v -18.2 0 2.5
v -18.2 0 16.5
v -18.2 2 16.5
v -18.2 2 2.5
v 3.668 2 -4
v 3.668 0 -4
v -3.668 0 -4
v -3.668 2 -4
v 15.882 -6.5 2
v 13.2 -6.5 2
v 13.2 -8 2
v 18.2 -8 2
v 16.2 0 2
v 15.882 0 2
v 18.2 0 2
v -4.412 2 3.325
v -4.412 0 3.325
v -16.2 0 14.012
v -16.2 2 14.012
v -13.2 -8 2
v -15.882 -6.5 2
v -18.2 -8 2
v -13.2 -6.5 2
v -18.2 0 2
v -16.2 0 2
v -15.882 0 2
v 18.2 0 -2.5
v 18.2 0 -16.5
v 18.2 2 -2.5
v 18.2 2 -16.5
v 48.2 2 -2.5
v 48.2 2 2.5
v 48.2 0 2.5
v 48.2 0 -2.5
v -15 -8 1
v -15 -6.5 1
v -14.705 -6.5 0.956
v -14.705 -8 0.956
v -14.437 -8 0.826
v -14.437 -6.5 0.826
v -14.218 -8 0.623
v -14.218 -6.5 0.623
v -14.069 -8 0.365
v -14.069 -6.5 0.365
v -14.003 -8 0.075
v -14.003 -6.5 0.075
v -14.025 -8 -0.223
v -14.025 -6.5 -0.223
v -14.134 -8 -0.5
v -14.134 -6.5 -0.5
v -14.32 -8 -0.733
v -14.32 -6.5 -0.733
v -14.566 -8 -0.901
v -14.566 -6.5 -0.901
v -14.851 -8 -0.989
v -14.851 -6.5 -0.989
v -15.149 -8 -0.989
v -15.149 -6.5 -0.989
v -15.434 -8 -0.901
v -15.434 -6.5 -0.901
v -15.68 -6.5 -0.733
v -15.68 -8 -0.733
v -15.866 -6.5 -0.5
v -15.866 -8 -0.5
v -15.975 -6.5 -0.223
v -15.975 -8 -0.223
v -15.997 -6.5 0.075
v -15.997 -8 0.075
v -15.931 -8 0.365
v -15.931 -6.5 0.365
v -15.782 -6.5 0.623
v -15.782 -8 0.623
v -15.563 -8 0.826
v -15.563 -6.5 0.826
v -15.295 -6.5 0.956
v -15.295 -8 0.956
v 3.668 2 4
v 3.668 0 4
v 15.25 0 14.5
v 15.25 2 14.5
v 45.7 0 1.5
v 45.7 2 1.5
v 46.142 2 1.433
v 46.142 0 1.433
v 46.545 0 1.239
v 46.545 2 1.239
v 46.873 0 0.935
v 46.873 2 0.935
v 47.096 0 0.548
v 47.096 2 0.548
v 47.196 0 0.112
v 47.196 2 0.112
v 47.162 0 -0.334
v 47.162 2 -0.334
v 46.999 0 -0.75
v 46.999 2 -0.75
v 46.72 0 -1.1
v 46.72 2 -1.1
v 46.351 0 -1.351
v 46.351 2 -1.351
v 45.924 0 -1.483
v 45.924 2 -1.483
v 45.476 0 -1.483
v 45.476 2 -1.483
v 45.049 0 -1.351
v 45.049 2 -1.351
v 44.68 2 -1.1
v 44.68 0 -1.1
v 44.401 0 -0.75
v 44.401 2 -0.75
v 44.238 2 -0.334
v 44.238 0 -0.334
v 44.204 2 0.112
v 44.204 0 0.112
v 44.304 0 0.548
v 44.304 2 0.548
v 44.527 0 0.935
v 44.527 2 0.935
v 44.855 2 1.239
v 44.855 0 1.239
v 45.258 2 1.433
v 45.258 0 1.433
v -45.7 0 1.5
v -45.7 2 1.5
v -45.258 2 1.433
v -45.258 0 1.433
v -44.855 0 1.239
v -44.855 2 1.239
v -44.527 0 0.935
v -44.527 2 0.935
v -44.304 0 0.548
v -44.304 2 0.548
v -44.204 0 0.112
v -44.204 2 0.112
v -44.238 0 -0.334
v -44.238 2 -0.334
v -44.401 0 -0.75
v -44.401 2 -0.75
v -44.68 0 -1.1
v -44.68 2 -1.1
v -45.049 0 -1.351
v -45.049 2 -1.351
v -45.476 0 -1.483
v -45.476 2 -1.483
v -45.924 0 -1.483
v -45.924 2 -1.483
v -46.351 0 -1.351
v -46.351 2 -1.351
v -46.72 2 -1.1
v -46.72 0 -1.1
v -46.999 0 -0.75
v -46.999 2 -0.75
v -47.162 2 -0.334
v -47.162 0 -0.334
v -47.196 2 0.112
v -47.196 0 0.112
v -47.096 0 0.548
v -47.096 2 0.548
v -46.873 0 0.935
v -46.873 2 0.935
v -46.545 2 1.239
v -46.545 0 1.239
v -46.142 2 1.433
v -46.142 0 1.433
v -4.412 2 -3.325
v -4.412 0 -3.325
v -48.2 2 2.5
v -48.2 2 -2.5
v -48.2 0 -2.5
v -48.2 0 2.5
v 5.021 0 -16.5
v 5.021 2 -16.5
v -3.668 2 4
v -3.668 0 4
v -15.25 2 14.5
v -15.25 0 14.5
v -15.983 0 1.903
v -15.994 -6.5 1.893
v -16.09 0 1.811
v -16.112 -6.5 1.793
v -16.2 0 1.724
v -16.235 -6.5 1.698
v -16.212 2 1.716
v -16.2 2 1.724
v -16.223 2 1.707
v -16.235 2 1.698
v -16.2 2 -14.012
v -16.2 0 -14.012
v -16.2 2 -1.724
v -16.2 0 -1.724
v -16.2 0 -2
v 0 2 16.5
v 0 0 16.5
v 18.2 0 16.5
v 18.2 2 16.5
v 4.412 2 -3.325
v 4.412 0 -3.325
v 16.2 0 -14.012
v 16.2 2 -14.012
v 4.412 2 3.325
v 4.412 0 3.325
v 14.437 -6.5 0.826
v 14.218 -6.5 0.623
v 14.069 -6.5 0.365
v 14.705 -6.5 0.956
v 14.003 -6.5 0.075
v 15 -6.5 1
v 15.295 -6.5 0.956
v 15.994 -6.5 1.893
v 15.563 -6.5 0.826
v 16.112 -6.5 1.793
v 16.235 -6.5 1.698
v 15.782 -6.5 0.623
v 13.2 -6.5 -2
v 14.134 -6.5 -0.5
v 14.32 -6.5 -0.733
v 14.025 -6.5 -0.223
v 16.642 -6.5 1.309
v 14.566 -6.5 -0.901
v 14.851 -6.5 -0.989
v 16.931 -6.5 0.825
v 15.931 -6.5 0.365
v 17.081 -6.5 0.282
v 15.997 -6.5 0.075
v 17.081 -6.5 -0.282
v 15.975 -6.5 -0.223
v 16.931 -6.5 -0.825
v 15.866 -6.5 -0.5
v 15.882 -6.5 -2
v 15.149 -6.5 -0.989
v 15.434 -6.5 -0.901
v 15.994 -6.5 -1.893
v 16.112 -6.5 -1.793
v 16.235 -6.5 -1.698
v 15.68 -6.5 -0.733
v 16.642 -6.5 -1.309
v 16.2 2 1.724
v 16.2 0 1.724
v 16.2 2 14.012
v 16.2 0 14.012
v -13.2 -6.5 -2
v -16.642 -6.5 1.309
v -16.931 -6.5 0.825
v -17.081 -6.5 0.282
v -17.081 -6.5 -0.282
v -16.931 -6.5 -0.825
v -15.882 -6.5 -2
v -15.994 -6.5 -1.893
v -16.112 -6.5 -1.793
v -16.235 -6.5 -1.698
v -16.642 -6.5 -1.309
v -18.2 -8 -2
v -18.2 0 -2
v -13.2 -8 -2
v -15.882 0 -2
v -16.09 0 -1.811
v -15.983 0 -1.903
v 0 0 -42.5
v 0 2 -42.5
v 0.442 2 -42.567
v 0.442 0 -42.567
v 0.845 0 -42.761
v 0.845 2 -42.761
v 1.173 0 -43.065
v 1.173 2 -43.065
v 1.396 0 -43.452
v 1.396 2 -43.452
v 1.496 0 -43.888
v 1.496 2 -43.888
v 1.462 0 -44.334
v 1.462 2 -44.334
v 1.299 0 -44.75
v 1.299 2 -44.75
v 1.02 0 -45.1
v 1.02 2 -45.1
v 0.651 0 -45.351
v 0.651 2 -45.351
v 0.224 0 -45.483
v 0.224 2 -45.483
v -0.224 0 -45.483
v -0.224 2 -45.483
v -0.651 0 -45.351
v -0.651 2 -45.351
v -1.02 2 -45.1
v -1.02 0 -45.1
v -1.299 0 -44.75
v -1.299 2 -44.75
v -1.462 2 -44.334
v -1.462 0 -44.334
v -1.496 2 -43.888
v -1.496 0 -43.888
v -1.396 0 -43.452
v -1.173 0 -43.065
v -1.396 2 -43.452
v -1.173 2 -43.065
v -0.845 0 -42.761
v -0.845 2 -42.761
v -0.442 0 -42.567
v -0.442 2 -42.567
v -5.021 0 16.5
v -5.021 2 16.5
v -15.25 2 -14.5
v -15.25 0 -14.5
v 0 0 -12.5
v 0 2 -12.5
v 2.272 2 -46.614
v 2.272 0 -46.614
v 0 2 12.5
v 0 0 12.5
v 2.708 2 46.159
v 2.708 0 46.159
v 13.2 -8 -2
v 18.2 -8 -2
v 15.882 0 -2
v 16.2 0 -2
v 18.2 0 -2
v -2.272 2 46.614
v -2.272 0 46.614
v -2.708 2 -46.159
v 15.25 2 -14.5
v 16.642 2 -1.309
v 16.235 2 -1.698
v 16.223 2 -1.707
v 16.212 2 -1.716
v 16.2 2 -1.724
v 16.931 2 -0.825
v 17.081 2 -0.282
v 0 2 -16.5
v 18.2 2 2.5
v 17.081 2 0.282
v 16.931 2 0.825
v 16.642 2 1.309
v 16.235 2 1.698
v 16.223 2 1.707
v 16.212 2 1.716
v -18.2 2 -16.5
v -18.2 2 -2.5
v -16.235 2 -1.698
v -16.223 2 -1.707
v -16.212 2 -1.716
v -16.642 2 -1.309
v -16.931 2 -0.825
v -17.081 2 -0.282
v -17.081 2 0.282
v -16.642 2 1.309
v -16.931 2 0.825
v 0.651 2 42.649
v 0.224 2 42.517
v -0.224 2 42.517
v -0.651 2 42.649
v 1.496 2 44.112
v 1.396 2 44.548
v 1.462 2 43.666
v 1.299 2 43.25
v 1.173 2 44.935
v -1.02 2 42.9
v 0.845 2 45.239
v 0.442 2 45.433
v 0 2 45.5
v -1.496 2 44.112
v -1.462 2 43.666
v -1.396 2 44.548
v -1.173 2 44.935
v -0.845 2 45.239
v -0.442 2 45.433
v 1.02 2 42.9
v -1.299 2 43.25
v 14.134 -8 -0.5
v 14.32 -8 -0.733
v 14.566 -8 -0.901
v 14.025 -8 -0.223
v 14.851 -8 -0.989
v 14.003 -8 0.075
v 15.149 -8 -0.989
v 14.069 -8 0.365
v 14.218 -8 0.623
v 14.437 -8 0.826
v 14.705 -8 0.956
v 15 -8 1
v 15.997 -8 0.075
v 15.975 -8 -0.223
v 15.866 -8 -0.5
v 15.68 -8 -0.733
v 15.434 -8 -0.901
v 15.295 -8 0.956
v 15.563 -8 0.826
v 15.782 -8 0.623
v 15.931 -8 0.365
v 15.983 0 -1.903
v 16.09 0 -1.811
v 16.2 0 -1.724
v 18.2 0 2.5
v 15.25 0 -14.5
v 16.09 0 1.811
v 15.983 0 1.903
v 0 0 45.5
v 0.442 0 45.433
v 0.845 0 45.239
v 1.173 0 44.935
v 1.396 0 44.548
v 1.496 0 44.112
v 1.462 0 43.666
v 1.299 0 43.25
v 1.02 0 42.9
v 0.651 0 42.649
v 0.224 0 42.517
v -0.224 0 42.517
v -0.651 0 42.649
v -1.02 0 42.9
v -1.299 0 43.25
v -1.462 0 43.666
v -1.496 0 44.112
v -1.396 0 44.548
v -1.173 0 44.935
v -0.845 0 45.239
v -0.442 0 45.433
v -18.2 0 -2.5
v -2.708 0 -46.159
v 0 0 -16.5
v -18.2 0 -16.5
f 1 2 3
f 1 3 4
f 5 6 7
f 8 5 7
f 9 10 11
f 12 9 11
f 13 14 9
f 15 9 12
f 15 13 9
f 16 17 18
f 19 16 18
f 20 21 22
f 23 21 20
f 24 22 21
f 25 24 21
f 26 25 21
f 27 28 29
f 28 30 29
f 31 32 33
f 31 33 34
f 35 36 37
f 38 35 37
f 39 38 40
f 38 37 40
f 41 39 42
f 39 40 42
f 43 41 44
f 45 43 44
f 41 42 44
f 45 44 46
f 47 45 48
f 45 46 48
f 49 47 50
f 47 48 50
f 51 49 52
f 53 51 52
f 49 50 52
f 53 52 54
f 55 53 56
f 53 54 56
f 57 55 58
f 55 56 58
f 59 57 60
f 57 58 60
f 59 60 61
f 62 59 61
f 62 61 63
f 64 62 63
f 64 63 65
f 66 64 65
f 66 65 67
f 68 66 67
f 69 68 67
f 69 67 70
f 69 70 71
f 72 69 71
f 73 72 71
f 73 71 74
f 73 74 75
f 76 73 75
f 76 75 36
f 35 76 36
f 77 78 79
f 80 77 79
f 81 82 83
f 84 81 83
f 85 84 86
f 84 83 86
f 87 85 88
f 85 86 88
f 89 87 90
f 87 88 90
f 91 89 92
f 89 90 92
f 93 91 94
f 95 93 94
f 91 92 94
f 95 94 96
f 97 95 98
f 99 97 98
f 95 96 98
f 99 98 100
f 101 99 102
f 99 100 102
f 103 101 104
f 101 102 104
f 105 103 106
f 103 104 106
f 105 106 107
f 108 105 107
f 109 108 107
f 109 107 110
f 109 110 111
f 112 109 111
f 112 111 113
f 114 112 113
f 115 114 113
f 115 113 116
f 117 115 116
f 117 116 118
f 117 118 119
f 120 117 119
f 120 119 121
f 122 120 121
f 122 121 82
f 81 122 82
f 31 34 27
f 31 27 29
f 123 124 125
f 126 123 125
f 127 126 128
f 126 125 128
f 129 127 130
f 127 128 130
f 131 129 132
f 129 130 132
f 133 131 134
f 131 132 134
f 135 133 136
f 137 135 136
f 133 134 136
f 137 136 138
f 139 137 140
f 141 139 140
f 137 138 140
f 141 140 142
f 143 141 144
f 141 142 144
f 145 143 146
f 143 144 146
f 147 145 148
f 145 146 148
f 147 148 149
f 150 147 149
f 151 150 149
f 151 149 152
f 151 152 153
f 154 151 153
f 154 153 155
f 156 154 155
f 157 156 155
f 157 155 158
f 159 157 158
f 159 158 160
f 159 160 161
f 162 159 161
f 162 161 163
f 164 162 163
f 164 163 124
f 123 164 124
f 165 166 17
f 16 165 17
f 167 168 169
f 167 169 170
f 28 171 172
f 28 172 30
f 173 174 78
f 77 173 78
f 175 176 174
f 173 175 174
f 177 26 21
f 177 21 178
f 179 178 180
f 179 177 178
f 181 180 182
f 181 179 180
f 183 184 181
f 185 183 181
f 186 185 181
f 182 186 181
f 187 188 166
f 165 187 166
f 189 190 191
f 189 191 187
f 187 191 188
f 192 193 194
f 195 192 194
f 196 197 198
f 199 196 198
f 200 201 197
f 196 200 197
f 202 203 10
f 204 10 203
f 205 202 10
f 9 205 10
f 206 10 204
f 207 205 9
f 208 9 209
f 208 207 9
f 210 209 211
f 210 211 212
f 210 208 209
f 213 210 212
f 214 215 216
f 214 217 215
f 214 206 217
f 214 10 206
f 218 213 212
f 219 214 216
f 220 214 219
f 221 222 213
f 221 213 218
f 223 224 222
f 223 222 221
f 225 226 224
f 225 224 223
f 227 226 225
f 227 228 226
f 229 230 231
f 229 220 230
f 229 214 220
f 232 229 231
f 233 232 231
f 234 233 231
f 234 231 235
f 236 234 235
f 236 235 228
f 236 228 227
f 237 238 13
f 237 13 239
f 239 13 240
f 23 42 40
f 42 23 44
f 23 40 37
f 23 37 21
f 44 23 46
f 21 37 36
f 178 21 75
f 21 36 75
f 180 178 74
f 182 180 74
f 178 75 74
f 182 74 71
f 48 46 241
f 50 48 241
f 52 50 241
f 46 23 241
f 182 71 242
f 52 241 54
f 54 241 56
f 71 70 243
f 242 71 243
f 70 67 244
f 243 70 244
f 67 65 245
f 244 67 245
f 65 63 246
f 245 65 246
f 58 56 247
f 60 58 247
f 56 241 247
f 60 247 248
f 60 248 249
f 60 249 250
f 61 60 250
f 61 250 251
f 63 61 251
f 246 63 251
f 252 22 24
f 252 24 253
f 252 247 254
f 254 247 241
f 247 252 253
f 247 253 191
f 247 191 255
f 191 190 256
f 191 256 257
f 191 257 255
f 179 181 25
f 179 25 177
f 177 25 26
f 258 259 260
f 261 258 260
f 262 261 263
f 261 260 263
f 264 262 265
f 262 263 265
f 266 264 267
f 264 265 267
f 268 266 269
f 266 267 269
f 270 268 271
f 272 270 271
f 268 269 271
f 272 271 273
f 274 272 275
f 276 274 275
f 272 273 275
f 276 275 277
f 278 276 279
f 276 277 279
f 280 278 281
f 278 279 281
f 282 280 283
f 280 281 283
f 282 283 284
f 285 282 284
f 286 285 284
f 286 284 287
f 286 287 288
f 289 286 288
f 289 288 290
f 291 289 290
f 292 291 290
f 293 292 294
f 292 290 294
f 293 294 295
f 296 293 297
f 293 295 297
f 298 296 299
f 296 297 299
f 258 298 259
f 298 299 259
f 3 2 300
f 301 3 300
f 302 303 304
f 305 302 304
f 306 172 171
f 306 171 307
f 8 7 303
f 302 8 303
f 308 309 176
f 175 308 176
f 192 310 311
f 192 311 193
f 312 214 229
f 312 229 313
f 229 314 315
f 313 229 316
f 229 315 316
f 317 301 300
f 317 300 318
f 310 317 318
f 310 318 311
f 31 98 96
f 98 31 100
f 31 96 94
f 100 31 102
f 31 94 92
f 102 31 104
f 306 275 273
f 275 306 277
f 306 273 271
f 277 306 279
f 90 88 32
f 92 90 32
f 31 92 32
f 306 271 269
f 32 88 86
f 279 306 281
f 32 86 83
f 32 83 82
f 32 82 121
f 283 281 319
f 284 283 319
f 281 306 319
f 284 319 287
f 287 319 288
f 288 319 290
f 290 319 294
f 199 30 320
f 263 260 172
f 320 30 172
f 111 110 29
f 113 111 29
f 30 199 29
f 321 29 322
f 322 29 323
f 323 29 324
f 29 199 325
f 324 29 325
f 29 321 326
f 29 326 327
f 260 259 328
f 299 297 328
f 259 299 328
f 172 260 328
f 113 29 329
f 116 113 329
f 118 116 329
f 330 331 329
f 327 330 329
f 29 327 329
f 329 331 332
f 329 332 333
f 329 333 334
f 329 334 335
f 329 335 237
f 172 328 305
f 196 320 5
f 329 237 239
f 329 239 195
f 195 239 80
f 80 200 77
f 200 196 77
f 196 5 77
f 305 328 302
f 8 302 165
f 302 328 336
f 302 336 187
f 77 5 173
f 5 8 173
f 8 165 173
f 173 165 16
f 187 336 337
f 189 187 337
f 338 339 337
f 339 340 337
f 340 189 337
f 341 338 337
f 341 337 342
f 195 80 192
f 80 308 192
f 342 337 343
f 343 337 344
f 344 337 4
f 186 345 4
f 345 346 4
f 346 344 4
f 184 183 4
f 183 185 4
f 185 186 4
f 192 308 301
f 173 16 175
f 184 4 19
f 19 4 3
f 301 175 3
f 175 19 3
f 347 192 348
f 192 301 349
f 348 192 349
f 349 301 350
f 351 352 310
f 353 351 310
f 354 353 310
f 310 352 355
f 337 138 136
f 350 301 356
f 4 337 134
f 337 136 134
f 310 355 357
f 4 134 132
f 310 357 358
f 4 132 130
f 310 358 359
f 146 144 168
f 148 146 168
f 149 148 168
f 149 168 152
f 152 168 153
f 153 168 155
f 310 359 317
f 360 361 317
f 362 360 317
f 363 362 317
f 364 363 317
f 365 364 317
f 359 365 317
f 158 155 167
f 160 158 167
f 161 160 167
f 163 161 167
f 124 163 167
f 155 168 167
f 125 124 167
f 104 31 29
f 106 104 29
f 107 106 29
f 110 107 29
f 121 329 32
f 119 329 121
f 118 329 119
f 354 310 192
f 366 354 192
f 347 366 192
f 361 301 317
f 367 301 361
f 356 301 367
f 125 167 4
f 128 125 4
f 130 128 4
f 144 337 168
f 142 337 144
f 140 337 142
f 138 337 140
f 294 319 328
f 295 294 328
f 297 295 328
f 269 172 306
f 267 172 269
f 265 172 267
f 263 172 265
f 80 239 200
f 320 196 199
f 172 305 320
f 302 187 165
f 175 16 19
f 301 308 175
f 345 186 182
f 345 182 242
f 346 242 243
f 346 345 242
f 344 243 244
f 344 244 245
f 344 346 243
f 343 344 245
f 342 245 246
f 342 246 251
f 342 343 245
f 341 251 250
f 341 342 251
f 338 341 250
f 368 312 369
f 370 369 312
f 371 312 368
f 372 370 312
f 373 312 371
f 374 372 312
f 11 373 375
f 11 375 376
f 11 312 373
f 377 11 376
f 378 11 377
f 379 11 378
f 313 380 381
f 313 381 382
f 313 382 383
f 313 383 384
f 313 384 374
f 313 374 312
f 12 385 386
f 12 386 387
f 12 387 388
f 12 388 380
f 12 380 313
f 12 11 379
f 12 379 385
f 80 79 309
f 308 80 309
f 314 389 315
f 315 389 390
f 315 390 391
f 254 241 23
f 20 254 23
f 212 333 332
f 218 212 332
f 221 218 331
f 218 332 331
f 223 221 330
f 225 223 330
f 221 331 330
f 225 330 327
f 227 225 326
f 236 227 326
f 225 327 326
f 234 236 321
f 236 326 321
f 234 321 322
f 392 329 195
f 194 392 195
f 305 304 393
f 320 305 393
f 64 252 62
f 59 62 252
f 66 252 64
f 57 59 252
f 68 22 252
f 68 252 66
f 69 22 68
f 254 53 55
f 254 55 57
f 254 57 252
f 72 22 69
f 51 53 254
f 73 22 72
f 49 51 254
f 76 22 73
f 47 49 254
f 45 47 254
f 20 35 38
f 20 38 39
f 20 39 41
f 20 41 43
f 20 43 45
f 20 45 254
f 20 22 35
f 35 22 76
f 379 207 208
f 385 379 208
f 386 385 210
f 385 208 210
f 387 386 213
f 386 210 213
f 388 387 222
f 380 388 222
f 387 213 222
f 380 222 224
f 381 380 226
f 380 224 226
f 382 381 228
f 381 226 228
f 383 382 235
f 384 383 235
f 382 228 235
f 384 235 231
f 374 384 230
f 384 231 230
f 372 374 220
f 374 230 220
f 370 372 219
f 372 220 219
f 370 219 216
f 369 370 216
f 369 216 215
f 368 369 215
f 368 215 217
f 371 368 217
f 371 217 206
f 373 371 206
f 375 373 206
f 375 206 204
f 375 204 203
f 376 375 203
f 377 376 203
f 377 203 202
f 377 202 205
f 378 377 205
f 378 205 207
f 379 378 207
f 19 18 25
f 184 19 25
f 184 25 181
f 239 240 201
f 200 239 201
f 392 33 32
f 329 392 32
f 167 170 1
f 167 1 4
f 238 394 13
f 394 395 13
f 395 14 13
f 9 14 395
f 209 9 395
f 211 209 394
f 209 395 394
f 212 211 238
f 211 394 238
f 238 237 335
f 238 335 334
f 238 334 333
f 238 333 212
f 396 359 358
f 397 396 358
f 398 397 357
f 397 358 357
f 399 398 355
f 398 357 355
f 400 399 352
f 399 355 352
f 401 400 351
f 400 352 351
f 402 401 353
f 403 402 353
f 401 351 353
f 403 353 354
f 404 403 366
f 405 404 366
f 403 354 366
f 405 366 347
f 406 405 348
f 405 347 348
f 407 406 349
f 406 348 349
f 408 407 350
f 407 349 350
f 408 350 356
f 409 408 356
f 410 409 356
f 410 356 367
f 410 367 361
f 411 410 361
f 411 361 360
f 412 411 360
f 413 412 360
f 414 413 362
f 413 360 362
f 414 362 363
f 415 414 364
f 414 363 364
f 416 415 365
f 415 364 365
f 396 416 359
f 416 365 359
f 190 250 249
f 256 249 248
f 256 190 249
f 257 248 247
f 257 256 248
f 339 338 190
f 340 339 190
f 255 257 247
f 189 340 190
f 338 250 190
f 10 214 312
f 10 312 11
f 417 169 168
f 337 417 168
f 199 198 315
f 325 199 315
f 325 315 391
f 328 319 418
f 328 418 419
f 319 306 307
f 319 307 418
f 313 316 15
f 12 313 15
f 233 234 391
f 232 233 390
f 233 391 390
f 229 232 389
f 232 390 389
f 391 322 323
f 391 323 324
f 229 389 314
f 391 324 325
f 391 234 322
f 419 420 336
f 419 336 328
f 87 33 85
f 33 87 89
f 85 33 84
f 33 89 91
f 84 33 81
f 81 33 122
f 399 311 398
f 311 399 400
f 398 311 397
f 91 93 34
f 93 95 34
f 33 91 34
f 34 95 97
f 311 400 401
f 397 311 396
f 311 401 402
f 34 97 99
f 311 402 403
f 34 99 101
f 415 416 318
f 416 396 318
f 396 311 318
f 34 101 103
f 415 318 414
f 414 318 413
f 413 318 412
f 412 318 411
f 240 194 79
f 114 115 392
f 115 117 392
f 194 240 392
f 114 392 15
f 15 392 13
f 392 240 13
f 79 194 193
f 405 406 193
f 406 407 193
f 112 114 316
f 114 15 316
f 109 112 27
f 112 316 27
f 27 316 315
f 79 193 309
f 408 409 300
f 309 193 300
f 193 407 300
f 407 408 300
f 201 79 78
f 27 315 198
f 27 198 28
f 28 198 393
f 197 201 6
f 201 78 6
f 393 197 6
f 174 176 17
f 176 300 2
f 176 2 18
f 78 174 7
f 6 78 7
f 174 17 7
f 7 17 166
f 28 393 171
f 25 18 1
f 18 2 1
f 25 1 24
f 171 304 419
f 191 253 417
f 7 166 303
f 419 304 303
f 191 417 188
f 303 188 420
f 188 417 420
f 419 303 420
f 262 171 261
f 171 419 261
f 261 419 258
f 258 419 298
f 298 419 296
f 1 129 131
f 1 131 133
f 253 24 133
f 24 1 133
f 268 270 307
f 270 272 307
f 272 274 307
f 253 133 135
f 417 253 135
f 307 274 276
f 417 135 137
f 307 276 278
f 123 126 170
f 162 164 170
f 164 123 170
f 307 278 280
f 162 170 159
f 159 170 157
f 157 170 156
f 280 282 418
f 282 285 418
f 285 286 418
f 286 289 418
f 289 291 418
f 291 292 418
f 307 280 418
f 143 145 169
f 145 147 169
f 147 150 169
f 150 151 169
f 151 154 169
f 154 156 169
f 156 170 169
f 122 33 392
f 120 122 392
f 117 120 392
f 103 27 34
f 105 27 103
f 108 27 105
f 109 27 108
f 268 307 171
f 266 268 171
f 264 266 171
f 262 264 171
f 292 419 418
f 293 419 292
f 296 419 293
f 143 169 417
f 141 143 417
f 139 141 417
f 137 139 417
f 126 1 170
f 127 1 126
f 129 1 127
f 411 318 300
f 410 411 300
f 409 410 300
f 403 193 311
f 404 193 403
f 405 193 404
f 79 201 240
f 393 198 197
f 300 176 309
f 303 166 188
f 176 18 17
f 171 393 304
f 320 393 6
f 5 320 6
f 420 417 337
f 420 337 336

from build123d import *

# Parameters (mm, degrees)
SKETCH1_W           = 36.4
SKETCH1_H           = 33
BOSS_EXTRUDE1_DEPTH = 2
SKETCH2_W           = 5
SKETCH2_H           = 4
BOSS_EXTRUDE2_DEPTH = 8
SKETCH4_R           = 1
CUT_EXTRUDE2_DEPTH  = 27.162759793
CUT_EXTRUDE1_DEPTH  = 8.5
SKETCH5_W           = 5
SKETCH5_H           = 2
BOSS_EXTRUDE3_DEPTH = 30
SKETCH6_W           = 5
SKETCH6_H           = 2
BOSS_EXTRUDE4_DEPTH = 30
SKETCH11_R          = 1.5
CUT_EXTRUDE3_DEPTH  = 52.918108594
SKETCH10_R          = 1.5
BOSS_EXTRUDE5_DEPTH = 2


with BuildPart() as part:
    # Sketch1 → Boss-Extrude1 (new body)
    with BuildSketch(Plane(origin=(0, 0, 0), x_dir=(1, 0, 0), z_dir=(0, 1, 0))):
        Rectangle(SKETCH1_W, SKETCH1_H)
        Polygon((-4.412121212, -3.325108971), (-16.2, -14.011922158), (-16.2, 14.011922158), (-4.412121212, 3.325108971), align=None, mode=Mode.SUBTRACT)
        Polygon((-15.249514138, -14.5), (-3.667695956, -4), (3.667695956, -4), (15.249514138, -14.5), (0, -12.5), align=None, mode=Mode.SUBTRACT)
        Polygon((16.2, -14.011922158), (4.412121212, -3.325108971), (4.412121212, 3.325108971), (16.2, 14.011922158), align=None, mode=Mode.SUBTRACT)
        Polygon((15.249514138, 14.5), (3.667695956, 4), (-3.667695956, 4), (-15.249514138, 14.5), (0, 12.5), align=None, mode=Mode.SUBTRACT)
    extrude(amount=BOSS_EXTRUDE1_DEPTH)

    # Sketch2 → Boss-Extrude2 (add)
    with BuildSketch(Plane.XZ):
        with Locations((15.7, 0)):
            Rectangle(SKETCH2_W, SKETCH2_H)
        with Locations((-15.7, 0)):
            Rectangle(SKETCH2_W, SKETCH2_H)
    extrude(amount=BOSS_EXTRUDE2_DEPTH)

    # Sketch4 → Cut-Extrude2 (cut, through all)
    with BuildSketch(Plane(origin=(0, 1, 0), x_dir=(1, 0, 0), z_dir=(0, 1, 0))):
        with Locations((15, 0)):
            Circle(SKETCH4_R)
        with Locations((-15, 0)):
            Circle(SKETCH4_R)
    extrude(amount=-CUT_EXTRUDE2_DEPTH, mode=Mode.SUBTRACT)

    # Sketch3 → Cut-Extrude1 (cut)
    with BuildSketch(Plane(origin=(0, 2, 0), x_dir=(1, 0, 0), z_dir=(0, 1, 0))):
        with BuildLine():
            Line((15, 4.124318125), (15, 4.257967602))
            Line((15, 4.257967602), (10.3221916, 4.257967602))
            Line((10.3221916, 4.257967602), (10.3221916, -5.239749404))
            Line((10.3221916, -5.239749404), (15, -5.239749404))
            Line((15, -5.239749404), (15, -4.124318125))
            ThreePointArc((15, -4.124318125), (15.326601634, -2.763090306), (16.235294118, -1.69824864))
            ThreePointArc((16.235294118, -1.69824864), (17.1, 0), (16.235294118, 1.69824864))
            ThreePointArc((16.235294118, 1.69824864), (15.326601634, 2.763090306), (15, 4.124318125))
        make_face()
        with BuildLine():
            Line((-10.3221916, -5.239749404), (-15, -5.239749404))
            Line((-15, -5.239749404), (-15, -4.124318125))
            ThreePointArc((-15, -4.124318125), (-15.326601634, -2.763090306), (-16.235294118, -1.69824864))
            ThreePointArc((-16.235294118, -1.69824864), (-17.1, 0), (-16.235294118, 1.69824864))
            ThreePointArc((-16.235294118, 1.69824864), (-15.326601634, 2.763090306), (-15, 4.124318125))
            Line((-15, 4.124318125), (-15, 4.257967602))
            Line((-15, 4.257967602), (-10.3221916, 4.257967602))
            Line((-10.3221916, 4.257967602), (-10.3221916, -5.239749404))
        make_face()
    extrude(amount=-CUT_EXTRUDE1_DEPTH, mode=Mode.SUBTRACT)

    # Sketch5 → Boss-Extrude3 (add)
    with BuildSketch(Plane.ZY.offset(18.2)):
        with Locations((0, 1)):
            Rectangle(SKETCH5_W, SKETCH5_H)
    extrude(amount=BOSS_EXTRUDE3_DEPTH)

    # Sketch6 → Boss-Extrude4 (add)
    with BuildSketch(Plane(origin=(18.2, 0, 0), x_dir=(0, 0, -1), z_dir=(1, 0, 0))):
        with Locations((0, 1)):
            Rectangle(SKETCH6_W, SKETCH6_H)
    extrude(amount=BOSS_EXTRUDE4_DEPTH)

    # Sketch11 → Cut-Extrude3 (cut, through all)
    with BuildSketch(Plane(origin=(0, 2, 0), x_dir=(1, 0, 0), z_dir=(0, 1, 0))):
        with Locations((-45.7, 0)):
            Circle(SKETCH11_R)
        with Locations((45.7, 0)):
            Circle(SKETCH11_R)
    extrude(amount=-CUT_EXTRUDE3_DEPTH, mode=Mode.SUBTRACT)

    # Sketch10 → Boss-Extrude5 (add)
    # profile 1 of 2: a face of its own
    with BuildSketch(Plane(origin=(0, 2, 0), x_dir=(1, 0, 0), z_dir=(0, 1, 0))):
        Polygon((0, -16.5), (-5.02079011, -16.5), (-2.27177232, -46.613981094), (2.707523657, -46.15943564), align=None)
        with Locations((0, -44)):
            Circle(SKETCH10_R, mode=Mode.SUBTRACT)
    # profile 2 of 2: a face of its own
    with BuildSketch(Plane(origin=(0, 2, 0), x_dir=(1, 0, 0), z_dir=(0, 1, 0))):
        Polygon((0, 16.5), (5.02079011, 16.5), (2.27177232, 46.613981094), (-2.707523657, 46.15943564), align=None)
        with Locations((0, 44)):
            Circle(SKETCH10_R, mode=Mode.SUBTRACT)
    extrude(amount=-BOSS_EXTRUDE5_DEPTH)


solid = part.part
